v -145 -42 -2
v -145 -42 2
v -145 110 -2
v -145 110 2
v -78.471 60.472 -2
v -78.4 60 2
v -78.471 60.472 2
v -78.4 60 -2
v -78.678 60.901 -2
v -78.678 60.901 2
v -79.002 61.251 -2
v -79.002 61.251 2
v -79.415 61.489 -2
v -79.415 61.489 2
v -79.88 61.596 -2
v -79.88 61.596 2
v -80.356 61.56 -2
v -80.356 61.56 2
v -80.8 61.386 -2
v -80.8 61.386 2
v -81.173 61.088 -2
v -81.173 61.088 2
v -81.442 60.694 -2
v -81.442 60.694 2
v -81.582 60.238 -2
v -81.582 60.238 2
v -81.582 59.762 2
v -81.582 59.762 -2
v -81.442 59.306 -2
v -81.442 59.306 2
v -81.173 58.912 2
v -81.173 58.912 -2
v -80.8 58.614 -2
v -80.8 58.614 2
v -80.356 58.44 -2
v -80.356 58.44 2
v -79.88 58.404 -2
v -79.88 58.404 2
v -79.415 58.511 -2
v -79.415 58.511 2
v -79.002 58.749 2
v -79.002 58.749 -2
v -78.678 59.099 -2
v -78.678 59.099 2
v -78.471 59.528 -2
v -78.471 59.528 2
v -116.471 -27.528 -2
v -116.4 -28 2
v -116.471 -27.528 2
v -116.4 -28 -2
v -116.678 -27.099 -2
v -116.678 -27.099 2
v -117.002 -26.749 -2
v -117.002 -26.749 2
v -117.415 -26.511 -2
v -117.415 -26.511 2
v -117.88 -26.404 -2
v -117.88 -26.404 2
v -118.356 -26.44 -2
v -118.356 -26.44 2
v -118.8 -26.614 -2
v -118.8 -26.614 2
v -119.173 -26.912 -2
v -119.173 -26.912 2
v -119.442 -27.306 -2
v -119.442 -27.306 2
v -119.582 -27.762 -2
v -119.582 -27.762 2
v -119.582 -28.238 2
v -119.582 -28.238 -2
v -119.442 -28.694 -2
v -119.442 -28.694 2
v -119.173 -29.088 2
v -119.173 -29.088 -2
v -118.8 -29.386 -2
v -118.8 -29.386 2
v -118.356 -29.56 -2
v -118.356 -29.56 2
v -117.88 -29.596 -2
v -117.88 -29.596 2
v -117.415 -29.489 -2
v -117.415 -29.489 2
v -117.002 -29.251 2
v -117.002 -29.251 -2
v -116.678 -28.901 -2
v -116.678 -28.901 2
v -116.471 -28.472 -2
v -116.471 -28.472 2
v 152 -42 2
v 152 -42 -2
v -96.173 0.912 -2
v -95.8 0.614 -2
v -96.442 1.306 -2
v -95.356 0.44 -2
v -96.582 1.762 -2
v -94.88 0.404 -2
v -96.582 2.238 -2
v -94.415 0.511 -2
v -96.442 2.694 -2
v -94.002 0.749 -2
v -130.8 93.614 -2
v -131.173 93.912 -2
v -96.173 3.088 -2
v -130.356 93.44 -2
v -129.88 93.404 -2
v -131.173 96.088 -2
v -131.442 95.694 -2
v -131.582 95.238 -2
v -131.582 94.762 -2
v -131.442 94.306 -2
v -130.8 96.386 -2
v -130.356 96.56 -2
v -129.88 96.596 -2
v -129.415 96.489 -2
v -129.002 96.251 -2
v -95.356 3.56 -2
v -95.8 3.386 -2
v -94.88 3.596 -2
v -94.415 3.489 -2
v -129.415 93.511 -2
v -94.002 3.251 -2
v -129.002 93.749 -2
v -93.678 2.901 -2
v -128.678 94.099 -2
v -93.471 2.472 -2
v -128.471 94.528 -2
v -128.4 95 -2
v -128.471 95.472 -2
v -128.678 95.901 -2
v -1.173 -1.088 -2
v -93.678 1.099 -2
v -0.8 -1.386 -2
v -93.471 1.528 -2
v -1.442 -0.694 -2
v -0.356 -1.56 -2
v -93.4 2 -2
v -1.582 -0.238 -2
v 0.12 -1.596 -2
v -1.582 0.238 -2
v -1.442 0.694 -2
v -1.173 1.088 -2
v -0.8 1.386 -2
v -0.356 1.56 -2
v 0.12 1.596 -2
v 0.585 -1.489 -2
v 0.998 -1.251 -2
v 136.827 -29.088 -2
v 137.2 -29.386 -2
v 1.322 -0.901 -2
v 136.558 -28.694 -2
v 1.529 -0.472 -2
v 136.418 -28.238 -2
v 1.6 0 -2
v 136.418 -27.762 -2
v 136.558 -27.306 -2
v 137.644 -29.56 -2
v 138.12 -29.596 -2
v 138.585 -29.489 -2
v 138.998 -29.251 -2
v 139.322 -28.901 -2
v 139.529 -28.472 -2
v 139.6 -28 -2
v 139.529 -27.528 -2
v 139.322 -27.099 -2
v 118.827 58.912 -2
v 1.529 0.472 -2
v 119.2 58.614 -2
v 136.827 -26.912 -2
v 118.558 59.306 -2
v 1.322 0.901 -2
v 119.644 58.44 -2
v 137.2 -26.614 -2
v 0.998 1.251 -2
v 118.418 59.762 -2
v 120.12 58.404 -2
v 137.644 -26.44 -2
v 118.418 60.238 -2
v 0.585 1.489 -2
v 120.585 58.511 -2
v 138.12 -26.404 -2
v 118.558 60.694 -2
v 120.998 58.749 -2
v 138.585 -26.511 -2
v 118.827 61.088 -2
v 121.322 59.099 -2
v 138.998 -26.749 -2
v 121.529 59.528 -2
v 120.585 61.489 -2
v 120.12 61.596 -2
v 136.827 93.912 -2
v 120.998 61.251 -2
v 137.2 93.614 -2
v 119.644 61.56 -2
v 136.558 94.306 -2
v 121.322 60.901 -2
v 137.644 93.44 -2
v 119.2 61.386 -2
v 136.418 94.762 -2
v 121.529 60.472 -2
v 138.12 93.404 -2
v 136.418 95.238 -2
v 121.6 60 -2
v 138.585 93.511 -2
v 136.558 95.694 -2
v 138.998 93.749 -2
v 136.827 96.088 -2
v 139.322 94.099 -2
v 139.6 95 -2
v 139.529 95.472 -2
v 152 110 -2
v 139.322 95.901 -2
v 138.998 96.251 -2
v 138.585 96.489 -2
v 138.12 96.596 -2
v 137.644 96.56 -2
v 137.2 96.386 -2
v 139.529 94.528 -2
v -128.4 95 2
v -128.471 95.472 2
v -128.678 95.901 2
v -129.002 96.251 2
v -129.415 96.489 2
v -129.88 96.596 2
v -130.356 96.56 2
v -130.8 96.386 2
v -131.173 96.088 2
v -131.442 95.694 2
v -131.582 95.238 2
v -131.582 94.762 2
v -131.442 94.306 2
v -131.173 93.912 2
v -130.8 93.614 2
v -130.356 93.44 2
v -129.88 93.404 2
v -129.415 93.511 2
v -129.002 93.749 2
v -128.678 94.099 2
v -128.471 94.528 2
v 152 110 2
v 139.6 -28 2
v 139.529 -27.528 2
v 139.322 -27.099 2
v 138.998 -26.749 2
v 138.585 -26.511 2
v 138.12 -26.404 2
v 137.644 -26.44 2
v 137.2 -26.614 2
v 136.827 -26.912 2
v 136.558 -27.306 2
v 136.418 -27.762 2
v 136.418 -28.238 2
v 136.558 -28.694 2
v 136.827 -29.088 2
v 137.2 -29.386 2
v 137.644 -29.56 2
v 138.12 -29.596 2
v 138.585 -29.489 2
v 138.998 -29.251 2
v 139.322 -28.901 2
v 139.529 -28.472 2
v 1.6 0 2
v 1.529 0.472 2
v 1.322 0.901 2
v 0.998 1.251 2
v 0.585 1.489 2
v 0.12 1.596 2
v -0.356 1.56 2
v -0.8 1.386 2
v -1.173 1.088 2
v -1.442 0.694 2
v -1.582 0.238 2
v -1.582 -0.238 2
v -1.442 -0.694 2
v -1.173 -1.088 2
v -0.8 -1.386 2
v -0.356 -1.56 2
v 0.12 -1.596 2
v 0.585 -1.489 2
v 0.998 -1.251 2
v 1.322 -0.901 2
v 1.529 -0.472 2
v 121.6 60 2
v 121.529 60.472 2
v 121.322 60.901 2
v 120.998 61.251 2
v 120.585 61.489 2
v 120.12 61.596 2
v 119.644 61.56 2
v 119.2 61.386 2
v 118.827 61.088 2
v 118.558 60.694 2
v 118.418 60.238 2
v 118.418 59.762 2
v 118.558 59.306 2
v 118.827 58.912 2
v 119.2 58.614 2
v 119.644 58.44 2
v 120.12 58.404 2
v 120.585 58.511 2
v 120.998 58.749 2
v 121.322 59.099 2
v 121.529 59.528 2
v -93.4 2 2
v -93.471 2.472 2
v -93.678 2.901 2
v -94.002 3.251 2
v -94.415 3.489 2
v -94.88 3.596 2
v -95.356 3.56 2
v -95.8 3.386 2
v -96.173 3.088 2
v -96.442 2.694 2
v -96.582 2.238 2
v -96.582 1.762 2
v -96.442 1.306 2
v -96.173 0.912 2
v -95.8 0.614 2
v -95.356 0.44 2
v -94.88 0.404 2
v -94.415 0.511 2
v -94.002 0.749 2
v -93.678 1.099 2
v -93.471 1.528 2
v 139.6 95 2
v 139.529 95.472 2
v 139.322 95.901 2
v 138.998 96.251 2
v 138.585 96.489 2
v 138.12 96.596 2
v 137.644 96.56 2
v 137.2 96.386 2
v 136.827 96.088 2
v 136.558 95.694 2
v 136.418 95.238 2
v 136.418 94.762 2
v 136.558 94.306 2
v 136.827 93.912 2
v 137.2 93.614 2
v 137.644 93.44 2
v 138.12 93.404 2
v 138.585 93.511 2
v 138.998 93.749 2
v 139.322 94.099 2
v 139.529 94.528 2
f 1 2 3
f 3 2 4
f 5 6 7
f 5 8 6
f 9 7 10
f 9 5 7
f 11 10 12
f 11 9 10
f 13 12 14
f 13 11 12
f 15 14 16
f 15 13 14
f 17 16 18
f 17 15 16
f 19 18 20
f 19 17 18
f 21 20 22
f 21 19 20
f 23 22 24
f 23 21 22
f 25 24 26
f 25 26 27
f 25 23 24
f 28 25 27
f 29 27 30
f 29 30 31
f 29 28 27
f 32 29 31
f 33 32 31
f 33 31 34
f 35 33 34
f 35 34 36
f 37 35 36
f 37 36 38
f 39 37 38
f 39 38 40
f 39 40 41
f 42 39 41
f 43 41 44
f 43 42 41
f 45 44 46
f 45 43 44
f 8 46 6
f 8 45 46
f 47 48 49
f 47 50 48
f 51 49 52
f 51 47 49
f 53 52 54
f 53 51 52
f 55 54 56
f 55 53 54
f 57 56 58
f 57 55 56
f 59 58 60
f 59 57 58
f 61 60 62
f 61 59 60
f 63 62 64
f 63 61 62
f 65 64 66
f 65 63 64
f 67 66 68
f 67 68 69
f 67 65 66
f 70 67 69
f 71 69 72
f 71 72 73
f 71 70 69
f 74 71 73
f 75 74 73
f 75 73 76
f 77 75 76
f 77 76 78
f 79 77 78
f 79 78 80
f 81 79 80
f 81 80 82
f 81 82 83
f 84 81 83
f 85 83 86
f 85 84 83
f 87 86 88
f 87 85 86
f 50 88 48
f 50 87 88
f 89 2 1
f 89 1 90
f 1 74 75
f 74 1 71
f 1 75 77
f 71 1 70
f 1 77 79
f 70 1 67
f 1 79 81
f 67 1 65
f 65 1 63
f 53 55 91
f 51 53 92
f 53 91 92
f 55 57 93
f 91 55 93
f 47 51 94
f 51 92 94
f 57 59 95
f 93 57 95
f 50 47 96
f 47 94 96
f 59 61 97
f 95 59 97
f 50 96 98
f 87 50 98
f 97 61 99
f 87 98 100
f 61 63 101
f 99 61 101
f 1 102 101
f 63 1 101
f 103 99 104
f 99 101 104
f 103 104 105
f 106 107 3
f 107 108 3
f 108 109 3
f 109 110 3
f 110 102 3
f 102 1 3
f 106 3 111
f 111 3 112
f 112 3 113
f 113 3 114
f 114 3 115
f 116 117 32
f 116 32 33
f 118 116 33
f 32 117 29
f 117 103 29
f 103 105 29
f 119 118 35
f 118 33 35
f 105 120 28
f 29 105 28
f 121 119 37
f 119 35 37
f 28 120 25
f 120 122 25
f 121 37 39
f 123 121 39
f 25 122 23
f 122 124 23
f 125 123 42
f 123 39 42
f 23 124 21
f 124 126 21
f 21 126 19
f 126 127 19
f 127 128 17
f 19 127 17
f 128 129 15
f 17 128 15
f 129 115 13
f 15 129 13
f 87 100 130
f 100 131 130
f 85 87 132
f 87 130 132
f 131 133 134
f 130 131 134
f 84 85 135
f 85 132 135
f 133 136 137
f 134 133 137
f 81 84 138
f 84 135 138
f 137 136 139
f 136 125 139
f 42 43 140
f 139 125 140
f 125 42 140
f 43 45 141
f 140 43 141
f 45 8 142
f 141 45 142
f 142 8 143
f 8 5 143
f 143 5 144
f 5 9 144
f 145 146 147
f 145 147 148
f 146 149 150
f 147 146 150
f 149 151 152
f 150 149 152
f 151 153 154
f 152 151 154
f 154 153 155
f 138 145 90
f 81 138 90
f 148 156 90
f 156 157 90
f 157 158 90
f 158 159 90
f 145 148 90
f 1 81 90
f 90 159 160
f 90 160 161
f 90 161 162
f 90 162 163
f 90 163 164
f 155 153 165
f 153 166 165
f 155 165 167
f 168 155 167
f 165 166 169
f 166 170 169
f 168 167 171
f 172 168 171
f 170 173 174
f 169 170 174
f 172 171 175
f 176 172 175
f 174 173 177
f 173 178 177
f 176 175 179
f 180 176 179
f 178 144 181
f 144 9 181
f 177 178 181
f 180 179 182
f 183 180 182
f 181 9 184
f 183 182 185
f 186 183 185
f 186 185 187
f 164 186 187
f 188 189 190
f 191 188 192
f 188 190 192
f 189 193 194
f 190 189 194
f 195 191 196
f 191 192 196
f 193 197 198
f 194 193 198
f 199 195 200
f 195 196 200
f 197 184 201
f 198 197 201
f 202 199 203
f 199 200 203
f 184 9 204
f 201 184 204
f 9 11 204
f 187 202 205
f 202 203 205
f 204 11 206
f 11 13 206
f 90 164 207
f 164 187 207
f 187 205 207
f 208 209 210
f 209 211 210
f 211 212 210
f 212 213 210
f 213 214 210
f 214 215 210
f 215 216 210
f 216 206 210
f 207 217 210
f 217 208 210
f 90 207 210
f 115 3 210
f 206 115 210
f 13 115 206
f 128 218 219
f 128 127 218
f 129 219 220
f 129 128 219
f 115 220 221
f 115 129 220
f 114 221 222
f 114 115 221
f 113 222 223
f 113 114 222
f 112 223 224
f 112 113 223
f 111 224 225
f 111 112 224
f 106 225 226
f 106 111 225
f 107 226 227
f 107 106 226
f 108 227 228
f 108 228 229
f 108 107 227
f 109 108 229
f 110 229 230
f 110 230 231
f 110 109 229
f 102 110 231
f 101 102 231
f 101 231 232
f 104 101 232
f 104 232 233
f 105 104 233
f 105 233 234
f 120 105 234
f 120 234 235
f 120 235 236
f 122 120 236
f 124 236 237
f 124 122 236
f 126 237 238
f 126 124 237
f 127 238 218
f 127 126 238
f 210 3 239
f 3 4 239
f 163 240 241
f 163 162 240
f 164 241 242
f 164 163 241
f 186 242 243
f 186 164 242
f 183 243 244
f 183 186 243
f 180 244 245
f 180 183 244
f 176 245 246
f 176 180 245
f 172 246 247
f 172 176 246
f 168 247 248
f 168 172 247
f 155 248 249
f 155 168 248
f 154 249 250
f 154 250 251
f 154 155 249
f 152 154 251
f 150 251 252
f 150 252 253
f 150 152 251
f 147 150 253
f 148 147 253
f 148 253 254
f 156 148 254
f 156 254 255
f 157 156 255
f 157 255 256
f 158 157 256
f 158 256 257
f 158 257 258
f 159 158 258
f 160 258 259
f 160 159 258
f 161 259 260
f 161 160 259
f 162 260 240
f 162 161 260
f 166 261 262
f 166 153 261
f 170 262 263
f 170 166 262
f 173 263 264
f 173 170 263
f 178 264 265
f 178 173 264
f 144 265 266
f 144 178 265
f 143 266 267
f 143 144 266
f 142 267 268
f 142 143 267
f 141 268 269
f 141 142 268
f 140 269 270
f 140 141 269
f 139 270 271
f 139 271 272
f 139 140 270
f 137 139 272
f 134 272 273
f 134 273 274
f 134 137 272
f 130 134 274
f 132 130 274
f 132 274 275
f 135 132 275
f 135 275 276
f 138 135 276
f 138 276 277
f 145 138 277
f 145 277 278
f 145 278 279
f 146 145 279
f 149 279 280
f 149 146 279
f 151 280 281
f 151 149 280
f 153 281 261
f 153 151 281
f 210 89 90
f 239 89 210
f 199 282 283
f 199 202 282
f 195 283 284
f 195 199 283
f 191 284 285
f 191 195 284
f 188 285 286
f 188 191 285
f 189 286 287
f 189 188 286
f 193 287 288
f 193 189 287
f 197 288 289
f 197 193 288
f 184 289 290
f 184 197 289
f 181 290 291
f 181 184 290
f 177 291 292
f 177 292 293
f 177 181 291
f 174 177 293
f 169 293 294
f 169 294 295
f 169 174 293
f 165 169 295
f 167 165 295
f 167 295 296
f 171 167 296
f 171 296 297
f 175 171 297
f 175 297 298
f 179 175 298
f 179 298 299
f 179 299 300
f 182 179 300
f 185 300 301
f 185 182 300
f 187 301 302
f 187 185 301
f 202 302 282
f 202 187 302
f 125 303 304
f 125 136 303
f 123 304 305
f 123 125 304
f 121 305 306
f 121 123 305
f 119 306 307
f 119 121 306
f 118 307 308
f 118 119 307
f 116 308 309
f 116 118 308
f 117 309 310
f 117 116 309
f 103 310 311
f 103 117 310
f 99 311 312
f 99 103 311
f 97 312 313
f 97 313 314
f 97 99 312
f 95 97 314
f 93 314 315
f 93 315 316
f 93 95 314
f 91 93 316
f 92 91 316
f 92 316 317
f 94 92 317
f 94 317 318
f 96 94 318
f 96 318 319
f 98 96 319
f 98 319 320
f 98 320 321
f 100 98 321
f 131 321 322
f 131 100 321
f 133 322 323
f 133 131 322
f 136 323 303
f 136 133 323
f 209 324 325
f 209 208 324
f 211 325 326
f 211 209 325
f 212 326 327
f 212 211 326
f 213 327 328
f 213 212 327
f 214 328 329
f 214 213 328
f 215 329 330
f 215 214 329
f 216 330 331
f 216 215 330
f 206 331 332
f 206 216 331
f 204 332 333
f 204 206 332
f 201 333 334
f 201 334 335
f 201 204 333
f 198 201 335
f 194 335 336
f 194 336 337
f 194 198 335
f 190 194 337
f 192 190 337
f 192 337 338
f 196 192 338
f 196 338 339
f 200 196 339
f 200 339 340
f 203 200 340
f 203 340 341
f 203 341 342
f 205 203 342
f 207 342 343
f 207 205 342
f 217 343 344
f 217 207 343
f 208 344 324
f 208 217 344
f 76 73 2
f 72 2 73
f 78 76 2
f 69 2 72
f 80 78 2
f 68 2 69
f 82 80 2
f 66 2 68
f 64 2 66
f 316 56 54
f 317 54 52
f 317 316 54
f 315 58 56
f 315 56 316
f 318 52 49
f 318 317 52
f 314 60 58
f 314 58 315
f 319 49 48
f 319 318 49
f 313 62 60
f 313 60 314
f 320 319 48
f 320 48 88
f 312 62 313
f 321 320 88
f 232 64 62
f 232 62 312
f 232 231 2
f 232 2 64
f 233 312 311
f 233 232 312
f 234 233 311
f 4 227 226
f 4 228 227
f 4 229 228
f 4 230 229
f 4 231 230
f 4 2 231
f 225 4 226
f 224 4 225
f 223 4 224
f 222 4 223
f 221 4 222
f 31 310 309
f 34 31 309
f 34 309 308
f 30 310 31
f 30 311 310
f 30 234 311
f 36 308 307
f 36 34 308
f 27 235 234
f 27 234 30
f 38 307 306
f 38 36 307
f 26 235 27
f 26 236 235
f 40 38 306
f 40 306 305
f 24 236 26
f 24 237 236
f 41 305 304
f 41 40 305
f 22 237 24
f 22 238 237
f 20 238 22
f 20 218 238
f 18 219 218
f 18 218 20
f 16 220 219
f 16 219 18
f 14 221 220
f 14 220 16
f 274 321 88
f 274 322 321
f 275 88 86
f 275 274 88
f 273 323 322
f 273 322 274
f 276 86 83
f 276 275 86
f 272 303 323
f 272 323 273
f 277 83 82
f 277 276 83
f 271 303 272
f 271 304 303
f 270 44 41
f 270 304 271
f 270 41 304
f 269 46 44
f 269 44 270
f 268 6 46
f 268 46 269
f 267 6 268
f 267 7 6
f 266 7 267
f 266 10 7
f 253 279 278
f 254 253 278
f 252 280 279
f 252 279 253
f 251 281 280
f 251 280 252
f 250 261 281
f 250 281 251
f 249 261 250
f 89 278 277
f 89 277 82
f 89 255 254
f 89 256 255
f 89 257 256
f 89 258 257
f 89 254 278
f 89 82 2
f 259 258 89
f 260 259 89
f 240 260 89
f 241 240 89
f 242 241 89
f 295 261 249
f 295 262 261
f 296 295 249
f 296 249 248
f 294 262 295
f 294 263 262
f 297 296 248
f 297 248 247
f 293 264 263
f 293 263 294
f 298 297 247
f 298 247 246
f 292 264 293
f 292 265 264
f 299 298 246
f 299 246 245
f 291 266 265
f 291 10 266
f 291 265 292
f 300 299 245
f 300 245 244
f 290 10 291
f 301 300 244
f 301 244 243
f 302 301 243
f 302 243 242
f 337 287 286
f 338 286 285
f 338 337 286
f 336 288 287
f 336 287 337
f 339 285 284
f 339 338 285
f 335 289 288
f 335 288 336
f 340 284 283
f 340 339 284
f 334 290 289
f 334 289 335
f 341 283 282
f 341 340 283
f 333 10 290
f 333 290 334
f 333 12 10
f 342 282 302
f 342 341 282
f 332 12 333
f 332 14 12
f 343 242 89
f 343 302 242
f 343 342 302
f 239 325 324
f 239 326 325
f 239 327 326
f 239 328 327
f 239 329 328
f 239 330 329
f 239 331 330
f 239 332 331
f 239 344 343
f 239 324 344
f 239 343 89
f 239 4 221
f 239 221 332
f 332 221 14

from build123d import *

# Parameters (mm, degrees)
SKETCH_1_W      = 297
SKETCH_1_H      = 152
SKETCH_1_R      = 1.6
EXTRUDE_1_DEPTH = 2


with BuildPart() as part:
    # 草图1 → 凸台-拉伸1 (new, symmetric)
    with BuildSketch(Plane.XY):
        with Locations((3.5, 34)):
            Rectangle(SKETCH_1_W, SKETCH_1_H)
        Circle(SKETCH_1_R, mode=Mode.SUBTRACT)
        with Locations((-80, 60)):
            Circle(SKETCH_1_R, mode=Mode.SUBTRACT)
        with Locations((120, 60)):
            Circle(SKETCH_1_R, mode=Mode.SUBTRACT)
        with Locations((-95, 2)):
            Circle(SKETCH_1_R, mode=Mode.SUBTRACT)
        with Locations((-118, -28)):
            Circle(SKETCH_1_R, mode=Mode.SUBTRACT)
        with Locations((138, -28)):
            Circle(SKETCH_1_R, mode=Mode.SUBTRACT)
        with Locations((-130, 95)):
            Circle(SKETCH_1_R, mode=Mode.SUBTRACT)
        with Locations((138, 95)):
            Circle(SKETCH_1_R, mode=Mode.SUBTRACT)
    extrude(amount=EXTRUDE_1_DEPTH, both=True)


solid = part.part
